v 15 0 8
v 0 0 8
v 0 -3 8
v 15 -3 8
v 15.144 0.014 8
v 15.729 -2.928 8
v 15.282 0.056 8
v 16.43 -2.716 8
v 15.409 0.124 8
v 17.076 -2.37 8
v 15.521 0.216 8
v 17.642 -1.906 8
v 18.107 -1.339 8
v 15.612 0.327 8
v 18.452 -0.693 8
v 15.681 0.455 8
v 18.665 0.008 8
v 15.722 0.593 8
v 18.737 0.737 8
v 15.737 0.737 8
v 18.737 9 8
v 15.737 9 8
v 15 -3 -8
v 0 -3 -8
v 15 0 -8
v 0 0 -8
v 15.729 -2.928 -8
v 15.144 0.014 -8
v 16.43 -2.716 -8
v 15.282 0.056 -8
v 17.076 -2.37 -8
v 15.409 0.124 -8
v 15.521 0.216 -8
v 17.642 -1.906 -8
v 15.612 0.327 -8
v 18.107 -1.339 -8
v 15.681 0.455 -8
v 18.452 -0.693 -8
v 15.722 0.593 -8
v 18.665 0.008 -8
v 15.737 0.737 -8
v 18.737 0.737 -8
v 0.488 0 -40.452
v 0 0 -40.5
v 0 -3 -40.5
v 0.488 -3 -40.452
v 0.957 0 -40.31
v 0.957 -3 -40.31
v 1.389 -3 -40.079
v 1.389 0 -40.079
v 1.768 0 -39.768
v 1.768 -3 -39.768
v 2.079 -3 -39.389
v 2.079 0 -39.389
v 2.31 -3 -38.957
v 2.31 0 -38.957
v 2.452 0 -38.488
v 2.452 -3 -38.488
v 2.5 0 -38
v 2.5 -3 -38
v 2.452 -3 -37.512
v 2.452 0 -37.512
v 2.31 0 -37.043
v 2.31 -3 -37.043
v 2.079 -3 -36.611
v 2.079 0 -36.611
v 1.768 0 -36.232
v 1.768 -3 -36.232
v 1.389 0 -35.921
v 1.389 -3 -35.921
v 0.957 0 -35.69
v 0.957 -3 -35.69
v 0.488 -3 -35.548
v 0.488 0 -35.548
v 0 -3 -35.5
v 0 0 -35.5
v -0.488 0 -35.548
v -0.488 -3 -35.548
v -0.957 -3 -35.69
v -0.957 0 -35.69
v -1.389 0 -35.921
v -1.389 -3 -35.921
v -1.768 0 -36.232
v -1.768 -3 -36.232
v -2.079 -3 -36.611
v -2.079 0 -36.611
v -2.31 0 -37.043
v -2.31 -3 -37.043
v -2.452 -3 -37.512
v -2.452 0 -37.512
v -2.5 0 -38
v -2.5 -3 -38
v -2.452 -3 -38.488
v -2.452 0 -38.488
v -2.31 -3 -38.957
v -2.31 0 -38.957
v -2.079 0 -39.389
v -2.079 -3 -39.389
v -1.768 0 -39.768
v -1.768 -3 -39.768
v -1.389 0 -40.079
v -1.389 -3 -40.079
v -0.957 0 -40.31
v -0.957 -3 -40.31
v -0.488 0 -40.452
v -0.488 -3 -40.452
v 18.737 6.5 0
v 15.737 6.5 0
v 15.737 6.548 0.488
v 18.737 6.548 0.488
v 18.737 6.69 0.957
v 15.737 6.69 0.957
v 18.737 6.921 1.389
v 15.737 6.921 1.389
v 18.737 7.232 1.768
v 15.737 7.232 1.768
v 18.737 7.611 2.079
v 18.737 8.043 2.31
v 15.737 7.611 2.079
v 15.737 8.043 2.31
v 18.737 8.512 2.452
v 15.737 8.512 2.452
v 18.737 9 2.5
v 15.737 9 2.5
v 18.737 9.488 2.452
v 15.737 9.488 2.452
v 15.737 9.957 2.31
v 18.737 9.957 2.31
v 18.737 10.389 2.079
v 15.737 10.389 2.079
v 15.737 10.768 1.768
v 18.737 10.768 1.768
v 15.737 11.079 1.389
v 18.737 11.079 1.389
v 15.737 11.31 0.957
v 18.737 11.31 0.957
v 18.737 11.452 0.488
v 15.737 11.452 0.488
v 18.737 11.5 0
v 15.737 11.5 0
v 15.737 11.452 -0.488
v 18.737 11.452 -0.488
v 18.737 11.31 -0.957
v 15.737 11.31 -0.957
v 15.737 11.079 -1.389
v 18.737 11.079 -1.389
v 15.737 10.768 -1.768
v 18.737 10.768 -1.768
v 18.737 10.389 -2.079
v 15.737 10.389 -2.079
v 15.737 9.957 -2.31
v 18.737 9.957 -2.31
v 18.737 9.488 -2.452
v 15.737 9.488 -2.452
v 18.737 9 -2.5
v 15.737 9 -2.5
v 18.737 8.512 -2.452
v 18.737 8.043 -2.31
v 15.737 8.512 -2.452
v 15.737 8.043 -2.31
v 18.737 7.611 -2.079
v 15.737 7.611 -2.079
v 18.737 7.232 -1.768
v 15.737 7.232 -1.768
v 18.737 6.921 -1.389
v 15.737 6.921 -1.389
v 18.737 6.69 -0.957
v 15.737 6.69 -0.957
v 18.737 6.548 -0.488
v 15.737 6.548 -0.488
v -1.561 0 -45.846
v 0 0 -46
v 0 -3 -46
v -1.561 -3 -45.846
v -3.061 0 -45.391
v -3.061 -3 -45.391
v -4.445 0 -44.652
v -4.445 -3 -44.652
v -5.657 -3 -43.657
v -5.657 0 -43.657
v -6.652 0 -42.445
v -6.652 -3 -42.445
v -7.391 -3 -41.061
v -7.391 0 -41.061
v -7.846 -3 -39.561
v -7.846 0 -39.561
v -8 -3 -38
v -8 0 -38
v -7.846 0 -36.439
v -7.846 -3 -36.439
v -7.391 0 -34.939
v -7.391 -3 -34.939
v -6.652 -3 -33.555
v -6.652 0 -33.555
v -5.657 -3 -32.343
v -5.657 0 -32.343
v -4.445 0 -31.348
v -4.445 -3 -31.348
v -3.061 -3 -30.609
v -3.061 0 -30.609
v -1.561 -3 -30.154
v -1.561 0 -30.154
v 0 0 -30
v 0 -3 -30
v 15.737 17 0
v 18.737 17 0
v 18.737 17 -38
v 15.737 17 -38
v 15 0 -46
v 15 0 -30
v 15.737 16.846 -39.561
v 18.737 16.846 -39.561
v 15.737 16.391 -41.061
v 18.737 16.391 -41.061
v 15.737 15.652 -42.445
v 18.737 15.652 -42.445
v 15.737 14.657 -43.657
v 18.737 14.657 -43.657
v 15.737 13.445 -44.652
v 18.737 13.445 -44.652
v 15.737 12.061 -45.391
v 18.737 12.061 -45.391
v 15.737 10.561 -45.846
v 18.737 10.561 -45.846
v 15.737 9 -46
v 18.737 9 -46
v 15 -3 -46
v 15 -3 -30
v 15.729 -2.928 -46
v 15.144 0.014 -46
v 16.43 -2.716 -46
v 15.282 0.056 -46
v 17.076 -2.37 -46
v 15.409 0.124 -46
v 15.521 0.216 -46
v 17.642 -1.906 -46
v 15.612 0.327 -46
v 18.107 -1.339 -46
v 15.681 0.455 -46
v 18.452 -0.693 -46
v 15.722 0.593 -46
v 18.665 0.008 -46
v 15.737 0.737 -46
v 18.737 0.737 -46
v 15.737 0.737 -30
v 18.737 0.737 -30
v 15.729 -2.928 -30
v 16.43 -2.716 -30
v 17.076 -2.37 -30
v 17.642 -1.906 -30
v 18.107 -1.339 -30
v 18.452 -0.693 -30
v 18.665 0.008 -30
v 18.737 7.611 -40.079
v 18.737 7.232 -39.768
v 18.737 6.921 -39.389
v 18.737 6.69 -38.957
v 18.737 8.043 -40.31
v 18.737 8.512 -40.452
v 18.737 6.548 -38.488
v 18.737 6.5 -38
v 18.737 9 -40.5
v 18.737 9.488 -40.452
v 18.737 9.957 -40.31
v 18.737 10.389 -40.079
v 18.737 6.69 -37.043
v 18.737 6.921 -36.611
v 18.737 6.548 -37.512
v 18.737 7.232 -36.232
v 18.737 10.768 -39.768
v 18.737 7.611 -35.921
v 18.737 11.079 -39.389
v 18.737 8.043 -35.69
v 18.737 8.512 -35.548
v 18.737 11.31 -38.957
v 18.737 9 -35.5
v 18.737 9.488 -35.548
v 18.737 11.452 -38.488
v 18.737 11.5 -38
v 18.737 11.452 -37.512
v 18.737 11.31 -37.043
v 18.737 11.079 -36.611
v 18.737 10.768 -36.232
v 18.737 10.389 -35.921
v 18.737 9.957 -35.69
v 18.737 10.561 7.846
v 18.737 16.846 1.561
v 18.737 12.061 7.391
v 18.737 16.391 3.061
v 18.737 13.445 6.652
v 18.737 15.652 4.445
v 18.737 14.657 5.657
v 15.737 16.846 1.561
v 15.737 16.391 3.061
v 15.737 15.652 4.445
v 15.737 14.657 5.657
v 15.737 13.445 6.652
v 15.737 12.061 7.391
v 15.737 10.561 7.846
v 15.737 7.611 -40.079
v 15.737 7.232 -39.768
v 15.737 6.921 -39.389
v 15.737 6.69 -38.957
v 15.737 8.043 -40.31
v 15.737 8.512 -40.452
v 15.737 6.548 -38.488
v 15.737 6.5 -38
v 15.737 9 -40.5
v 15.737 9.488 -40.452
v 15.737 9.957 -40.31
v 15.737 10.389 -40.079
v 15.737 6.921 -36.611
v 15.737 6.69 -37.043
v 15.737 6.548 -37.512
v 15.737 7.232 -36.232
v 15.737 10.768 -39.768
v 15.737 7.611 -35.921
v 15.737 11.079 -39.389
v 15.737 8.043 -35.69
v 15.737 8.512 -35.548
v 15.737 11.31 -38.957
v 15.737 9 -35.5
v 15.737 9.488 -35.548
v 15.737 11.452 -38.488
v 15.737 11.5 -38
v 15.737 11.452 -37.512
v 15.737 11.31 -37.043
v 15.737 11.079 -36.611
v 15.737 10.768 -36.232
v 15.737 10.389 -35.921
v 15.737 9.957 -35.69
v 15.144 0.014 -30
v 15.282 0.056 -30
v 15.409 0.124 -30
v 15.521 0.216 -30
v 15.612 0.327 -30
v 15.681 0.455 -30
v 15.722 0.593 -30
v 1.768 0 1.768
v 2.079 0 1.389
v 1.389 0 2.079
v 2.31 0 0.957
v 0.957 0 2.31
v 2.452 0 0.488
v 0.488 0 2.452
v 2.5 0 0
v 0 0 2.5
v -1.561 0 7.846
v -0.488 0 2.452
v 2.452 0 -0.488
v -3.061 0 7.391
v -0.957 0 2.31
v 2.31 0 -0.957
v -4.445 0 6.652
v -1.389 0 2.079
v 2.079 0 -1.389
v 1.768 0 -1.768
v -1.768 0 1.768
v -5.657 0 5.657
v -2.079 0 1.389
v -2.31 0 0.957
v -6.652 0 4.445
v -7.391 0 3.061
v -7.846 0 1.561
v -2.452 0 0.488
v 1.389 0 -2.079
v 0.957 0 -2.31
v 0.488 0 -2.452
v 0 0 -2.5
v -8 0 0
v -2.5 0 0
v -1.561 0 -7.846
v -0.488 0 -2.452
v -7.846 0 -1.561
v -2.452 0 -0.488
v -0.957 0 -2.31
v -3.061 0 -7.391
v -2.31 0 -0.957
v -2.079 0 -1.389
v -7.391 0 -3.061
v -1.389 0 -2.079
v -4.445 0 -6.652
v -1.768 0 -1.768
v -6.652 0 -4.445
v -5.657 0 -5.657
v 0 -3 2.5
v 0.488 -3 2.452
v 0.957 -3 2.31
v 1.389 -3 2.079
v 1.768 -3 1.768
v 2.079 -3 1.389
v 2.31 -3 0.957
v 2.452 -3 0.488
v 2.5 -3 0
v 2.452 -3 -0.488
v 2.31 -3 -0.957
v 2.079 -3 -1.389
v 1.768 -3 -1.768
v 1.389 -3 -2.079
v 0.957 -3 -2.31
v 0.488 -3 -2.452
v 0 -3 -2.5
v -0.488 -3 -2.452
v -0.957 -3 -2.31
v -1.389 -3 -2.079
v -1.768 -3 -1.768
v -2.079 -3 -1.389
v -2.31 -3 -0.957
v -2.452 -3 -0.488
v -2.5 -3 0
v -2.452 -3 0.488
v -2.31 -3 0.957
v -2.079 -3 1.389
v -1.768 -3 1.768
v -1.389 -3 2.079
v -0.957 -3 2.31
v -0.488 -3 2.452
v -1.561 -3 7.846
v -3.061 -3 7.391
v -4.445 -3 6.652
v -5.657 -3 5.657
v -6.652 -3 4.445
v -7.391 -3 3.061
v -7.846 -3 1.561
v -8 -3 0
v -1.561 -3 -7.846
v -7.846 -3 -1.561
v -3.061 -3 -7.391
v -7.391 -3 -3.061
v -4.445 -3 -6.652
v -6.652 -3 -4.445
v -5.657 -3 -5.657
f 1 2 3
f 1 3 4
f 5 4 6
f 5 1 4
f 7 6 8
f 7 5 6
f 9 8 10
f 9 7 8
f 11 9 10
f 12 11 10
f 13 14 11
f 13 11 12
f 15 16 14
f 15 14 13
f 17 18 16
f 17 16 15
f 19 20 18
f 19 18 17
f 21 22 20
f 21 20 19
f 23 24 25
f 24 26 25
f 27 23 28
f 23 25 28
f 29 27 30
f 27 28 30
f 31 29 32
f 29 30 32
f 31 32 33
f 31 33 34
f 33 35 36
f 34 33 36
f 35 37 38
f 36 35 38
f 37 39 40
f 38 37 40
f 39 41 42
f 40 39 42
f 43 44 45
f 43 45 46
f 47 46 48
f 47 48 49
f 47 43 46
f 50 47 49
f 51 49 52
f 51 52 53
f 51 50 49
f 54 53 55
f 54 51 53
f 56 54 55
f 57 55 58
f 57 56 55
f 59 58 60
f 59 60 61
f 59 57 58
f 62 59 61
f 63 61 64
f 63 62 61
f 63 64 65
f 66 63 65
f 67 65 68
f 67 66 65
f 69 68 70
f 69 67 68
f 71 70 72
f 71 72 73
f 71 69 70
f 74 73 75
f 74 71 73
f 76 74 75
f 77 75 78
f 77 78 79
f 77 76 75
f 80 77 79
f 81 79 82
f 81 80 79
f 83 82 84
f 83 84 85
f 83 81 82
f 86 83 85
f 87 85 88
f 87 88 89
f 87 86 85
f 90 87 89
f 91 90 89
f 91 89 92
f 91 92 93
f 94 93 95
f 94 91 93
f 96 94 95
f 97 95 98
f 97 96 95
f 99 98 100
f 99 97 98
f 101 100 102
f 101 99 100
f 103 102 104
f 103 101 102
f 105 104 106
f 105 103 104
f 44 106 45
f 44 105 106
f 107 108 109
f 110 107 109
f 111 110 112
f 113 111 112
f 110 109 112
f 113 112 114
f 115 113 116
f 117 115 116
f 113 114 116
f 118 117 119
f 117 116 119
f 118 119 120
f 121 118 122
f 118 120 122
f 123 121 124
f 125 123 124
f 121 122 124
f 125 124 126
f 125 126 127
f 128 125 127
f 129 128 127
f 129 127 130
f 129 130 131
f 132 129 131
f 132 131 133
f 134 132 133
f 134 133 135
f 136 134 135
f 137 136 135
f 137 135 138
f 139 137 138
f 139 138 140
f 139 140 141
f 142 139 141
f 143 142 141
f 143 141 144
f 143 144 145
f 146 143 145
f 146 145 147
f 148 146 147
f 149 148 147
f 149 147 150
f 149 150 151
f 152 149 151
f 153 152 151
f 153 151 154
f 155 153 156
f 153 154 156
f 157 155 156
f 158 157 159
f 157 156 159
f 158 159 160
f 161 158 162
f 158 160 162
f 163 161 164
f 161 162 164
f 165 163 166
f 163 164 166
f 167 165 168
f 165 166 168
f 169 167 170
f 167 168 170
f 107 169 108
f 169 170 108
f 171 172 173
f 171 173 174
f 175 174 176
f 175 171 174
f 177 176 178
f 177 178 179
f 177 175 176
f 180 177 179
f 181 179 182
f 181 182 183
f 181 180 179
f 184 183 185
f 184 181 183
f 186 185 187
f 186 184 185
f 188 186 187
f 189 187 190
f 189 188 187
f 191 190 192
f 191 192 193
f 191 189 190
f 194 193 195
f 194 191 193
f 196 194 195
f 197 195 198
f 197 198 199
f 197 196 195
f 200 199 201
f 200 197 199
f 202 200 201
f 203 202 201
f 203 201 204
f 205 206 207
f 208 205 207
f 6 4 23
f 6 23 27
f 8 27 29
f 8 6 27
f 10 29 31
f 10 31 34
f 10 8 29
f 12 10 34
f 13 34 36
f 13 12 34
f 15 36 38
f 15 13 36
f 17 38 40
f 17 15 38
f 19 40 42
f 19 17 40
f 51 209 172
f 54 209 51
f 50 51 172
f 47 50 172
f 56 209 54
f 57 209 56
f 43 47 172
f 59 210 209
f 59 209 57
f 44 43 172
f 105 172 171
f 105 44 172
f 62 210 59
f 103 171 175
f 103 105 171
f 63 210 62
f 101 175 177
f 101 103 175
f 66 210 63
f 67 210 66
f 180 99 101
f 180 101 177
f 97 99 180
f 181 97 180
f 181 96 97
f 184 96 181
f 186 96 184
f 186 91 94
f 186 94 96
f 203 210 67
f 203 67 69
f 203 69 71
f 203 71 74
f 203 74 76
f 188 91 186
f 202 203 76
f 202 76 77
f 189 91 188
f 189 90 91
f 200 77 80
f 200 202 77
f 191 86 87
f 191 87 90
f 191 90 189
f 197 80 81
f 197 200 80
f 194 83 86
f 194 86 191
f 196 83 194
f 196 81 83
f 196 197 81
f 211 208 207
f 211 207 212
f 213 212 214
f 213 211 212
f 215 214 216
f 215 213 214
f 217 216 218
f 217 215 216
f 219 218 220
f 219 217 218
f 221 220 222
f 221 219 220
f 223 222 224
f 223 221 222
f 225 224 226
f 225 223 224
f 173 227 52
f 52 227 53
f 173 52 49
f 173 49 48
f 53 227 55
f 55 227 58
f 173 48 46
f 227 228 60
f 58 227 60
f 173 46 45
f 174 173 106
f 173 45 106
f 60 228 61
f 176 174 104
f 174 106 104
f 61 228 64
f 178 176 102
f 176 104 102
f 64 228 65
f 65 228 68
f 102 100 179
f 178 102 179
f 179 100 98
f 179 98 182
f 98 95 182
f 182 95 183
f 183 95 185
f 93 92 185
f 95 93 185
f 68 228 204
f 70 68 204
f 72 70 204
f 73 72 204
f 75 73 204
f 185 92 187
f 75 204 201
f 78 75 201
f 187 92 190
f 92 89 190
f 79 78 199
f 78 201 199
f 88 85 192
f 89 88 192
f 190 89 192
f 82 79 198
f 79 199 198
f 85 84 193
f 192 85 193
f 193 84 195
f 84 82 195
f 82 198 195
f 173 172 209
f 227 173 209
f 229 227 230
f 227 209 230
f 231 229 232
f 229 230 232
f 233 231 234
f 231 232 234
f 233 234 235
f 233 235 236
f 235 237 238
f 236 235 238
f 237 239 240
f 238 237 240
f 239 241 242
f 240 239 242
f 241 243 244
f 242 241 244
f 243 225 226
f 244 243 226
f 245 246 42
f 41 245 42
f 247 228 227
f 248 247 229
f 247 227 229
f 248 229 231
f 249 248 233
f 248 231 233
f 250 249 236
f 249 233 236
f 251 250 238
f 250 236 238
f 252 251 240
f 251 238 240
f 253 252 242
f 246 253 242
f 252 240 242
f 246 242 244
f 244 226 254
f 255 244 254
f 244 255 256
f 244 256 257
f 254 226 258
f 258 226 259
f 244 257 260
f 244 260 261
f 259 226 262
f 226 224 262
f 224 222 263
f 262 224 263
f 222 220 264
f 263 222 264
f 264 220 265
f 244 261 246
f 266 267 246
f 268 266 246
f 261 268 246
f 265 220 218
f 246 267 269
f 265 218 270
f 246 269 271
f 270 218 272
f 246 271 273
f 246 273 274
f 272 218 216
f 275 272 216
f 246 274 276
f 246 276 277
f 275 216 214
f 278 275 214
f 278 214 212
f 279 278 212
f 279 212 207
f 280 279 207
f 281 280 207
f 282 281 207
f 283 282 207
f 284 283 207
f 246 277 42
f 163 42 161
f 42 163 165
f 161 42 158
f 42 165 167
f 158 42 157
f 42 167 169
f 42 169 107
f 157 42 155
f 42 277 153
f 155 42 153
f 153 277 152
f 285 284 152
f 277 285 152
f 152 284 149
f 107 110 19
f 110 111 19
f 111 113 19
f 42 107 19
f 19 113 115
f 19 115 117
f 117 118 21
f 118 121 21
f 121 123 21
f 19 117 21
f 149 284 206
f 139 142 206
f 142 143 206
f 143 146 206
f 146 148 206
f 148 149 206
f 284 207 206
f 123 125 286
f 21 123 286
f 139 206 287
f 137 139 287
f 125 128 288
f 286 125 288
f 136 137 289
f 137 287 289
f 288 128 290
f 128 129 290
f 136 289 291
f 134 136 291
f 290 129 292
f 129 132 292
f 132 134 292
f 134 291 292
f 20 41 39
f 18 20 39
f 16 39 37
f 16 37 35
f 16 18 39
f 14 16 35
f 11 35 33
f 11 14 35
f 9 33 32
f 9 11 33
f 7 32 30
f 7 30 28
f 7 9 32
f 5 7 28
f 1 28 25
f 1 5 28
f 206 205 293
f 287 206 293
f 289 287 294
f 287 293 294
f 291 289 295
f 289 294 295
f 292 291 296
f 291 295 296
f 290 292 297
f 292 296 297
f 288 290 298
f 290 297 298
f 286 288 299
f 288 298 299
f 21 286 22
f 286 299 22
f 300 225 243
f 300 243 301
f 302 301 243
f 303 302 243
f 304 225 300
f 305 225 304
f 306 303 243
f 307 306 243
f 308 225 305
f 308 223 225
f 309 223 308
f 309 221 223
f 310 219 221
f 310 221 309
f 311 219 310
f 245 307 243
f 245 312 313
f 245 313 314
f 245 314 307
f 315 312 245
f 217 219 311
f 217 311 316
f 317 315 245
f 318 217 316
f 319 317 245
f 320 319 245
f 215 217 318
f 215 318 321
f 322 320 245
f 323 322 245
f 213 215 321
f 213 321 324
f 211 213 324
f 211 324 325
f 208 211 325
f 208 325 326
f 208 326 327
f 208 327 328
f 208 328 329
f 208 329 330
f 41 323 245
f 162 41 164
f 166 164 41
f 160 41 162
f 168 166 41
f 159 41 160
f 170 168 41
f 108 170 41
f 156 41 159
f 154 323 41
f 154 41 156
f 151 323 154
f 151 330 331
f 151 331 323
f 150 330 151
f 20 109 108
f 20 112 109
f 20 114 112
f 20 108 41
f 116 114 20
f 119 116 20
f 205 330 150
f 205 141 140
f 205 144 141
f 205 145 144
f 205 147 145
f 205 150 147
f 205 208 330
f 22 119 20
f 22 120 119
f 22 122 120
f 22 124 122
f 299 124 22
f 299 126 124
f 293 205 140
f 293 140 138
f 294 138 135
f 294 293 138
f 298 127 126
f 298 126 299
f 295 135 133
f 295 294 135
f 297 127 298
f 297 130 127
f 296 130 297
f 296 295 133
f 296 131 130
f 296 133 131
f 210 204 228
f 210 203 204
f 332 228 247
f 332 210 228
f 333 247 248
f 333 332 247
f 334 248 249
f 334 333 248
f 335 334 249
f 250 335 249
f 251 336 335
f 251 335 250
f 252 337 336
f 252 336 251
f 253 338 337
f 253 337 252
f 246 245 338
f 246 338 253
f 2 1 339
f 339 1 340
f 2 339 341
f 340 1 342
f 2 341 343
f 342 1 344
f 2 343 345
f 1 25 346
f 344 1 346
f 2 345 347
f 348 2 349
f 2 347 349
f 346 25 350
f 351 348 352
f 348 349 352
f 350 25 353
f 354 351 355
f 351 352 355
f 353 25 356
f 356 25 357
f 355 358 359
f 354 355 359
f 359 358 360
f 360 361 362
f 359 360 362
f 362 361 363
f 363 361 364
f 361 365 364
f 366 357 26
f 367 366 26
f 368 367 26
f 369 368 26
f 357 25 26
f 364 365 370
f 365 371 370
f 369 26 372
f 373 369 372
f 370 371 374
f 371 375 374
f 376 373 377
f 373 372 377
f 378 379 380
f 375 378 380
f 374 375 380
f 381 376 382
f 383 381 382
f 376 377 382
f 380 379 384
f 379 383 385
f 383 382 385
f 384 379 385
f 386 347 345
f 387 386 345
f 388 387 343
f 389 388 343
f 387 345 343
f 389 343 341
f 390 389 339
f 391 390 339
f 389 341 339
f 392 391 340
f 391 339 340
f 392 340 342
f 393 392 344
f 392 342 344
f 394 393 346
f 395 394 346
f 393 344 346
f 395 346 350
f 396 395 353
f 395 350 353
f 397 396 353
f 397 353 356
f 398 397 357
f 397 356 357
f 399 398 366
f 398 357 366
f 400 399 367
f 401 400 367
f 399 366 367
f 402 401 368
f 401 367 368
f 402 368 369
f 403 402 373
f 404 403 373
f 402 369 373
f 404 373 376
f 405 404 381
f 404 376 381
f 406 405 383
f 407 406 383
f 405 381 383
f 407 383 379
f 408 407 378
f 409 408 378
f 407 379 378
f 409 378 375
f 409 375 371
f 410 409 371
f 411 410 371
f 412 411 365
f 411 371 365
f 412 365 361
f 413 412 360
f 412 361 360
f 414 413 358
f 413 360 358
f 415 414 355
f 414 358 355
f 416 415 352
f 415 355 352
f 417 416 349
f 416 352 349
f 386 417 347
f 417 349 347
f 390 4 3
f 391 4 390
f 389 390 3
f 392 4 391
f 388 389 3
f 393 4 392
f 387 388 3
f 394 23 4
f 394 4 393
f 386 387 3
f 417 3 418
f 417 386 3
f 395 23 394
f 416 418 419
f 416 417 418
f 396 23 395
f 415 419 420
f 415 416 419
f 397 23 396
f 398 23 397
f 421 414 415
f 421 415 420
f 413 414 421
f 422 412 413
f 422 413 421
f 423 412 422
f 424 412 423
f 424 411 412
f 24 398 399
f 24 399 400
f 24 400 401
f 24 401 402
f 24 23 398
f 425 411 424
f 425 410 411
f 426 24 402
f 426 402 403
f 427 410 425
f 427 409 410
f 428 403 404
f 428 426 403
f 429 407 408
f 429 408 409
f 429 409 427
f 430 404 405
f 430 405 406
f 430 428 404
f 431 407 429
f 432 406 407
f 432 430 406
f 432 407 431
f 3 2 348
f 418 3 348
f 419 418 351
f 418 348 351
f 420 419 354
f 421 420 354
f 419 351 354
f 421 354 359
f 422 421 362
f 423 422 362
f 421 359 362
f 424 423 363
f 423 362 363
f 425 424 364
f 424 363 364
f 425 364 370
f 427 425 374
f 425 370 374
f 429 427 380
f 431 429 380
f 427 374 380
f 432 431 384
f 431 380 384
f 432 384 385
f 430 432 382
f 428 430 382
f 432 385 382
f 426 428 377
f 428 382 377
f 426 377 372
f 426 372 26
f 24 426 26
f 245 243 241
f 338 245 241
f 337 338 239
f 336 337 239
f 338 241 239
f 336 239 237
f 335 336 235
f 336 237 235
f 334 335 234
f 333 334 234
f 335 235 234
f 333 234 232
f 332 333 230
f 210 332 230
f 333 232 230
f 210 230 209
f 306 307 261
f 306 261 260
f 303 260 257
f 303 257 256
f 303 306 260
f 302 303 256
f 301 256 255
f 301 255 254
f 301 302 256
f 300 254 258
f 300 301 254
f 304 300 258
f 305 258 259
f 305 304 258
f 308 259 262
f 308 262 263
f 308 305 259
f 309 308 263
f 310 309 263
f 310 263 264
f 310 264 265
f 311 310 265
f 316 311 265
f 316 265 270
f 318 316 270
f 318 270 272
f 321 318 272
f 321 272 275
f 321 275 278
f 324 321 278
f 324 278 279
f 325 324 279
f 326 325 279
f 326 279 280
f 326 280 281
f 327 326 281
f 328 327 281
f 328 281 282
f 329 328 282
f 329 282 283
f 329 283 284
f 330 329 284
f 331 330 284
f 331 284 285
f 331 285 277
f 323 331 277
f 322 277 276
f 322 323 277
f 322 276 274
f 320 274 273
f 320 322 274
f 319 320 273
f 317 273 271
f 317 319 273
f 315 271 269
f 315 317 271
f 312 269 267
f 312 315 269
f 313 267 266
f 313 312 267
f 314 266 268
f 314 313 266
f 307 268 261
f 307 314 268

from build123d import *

# Parameters (mm, degrees)
SKETCH1_R          = 2.5
BASE_FLANGE1_DEPTH = 3
EDGE_FLANGE1_DEPTH = 16
SKETCH10_R         = 2.5
CUT_EXTRUDE1_DEPTH = 10
TAB1_START         = -3
TAB1_DEPTH         = 3


# Read off the part's stored shape, not the designer's step: Tab1
# Sheet-metal steps are written as plain solids
with BuildPart() as part:
    # Sketch1 → Base-Flange1 (new body)
    with BuildSketch(Plane(origin=(0, 0, 0), x_dir=(1, 0, 0), z_dir=(0, 1, 0))):
        with BuildLine():
            Line((15, -8), (0, -8))
            ThreePointArc((0, -8), (-8, 0), (0, 8))
            Line((0, 8), (15, 8))
            Line((15, 8), (15, -8))
        make_face()
        with Locations(Location((0, 0, 0), (0, 0, 270))):
            Circle(SKETCH1_R, mode=Mode.SUBTRACT)
    extrude(amount=-BASE_FLANGE1_DEPTH)

    # Edge-Flange1 section (across the edge) → Edge-Flange1 (add)
    with BuildSketch(Plane(origin=(15.7366, 0, 8), x_dir=(-1, 0, 0), z_dir=(0, 0, -1))):
        with BuildLine():
            Line((-3, 0.7366), (-3, 17))
            Line((-3, 17), (0, 17))
            Line((0, 17), (0, 0.7366))
            ThreePointArc((0, 0.7366), (0.215745145, 0.215745145), (0.7366, 0))
            Line((0.7366, 0), (0.7366, -3))
            ThreePointArc((0.7366, -3), (-1.905575199, -1.905575199), (-3, 0.7366))
        make_face()
    extrude(amount=EDGE_FLANGE1_DEPTH)

    # Sketch10 → Cut-Extrude1 (cut)
    with BuildSketch(Plane.ZY.offset(-15.7366)):
        with BuildLine():
            Line((-8, 17), (-8, 9))
            ThreePointArc((-8, 9), (-5.656854249, 14.656854249), (0, 17))
            Line((0, 17), (-8, 17))
        make_face()
        with BuildLine():
            Line((8, 17), (0, 17))
            ThreePointArc((0, 17), (5.656854249, 14.656854249), (8, 9))
            Line((8, 9), (8, 17))
        make_face()
        with Locations(Location((0, 9, 0), (0, 0, 270))):
            Circle(SKETCH10_R)
    extrude(amount=-CUT_EXTRUDE1_DEPTH, mode=Mode.SUBTRACT)


with BuildPart() as body_2:
    # Mirror1: mirrored copy
    add(part.part.mirror(Plane.XY.offset(-19)))


with BuildPart() as part_1:
    add(part.part)

    add(body_2.part)  # Tab1 merges body 2
    # Tab1 outline → Tab1 (add)
    with BuildSketch(Plane.ZY.offset(-15.7366).offset(TAB1_START)):
        with BuildLine():
            ThreePointArc((-8, 9), (-5.656854249, 14.656854249), (0, 17))
            Line((0, 17), (-38, 17))
            ThreePointArc((-38, 17), (-32.343145751, 14.656854249), (-30, 9))
            Line((-30, 9), (-30, 0.7366))
            Line((-30, 0.7366), (-8, 0.7366))
            Line((-8, 0.7366), (-8, 9))
        make_face()
    extrude(amount=TAB1_DEPTH)


solid = part_1.part
